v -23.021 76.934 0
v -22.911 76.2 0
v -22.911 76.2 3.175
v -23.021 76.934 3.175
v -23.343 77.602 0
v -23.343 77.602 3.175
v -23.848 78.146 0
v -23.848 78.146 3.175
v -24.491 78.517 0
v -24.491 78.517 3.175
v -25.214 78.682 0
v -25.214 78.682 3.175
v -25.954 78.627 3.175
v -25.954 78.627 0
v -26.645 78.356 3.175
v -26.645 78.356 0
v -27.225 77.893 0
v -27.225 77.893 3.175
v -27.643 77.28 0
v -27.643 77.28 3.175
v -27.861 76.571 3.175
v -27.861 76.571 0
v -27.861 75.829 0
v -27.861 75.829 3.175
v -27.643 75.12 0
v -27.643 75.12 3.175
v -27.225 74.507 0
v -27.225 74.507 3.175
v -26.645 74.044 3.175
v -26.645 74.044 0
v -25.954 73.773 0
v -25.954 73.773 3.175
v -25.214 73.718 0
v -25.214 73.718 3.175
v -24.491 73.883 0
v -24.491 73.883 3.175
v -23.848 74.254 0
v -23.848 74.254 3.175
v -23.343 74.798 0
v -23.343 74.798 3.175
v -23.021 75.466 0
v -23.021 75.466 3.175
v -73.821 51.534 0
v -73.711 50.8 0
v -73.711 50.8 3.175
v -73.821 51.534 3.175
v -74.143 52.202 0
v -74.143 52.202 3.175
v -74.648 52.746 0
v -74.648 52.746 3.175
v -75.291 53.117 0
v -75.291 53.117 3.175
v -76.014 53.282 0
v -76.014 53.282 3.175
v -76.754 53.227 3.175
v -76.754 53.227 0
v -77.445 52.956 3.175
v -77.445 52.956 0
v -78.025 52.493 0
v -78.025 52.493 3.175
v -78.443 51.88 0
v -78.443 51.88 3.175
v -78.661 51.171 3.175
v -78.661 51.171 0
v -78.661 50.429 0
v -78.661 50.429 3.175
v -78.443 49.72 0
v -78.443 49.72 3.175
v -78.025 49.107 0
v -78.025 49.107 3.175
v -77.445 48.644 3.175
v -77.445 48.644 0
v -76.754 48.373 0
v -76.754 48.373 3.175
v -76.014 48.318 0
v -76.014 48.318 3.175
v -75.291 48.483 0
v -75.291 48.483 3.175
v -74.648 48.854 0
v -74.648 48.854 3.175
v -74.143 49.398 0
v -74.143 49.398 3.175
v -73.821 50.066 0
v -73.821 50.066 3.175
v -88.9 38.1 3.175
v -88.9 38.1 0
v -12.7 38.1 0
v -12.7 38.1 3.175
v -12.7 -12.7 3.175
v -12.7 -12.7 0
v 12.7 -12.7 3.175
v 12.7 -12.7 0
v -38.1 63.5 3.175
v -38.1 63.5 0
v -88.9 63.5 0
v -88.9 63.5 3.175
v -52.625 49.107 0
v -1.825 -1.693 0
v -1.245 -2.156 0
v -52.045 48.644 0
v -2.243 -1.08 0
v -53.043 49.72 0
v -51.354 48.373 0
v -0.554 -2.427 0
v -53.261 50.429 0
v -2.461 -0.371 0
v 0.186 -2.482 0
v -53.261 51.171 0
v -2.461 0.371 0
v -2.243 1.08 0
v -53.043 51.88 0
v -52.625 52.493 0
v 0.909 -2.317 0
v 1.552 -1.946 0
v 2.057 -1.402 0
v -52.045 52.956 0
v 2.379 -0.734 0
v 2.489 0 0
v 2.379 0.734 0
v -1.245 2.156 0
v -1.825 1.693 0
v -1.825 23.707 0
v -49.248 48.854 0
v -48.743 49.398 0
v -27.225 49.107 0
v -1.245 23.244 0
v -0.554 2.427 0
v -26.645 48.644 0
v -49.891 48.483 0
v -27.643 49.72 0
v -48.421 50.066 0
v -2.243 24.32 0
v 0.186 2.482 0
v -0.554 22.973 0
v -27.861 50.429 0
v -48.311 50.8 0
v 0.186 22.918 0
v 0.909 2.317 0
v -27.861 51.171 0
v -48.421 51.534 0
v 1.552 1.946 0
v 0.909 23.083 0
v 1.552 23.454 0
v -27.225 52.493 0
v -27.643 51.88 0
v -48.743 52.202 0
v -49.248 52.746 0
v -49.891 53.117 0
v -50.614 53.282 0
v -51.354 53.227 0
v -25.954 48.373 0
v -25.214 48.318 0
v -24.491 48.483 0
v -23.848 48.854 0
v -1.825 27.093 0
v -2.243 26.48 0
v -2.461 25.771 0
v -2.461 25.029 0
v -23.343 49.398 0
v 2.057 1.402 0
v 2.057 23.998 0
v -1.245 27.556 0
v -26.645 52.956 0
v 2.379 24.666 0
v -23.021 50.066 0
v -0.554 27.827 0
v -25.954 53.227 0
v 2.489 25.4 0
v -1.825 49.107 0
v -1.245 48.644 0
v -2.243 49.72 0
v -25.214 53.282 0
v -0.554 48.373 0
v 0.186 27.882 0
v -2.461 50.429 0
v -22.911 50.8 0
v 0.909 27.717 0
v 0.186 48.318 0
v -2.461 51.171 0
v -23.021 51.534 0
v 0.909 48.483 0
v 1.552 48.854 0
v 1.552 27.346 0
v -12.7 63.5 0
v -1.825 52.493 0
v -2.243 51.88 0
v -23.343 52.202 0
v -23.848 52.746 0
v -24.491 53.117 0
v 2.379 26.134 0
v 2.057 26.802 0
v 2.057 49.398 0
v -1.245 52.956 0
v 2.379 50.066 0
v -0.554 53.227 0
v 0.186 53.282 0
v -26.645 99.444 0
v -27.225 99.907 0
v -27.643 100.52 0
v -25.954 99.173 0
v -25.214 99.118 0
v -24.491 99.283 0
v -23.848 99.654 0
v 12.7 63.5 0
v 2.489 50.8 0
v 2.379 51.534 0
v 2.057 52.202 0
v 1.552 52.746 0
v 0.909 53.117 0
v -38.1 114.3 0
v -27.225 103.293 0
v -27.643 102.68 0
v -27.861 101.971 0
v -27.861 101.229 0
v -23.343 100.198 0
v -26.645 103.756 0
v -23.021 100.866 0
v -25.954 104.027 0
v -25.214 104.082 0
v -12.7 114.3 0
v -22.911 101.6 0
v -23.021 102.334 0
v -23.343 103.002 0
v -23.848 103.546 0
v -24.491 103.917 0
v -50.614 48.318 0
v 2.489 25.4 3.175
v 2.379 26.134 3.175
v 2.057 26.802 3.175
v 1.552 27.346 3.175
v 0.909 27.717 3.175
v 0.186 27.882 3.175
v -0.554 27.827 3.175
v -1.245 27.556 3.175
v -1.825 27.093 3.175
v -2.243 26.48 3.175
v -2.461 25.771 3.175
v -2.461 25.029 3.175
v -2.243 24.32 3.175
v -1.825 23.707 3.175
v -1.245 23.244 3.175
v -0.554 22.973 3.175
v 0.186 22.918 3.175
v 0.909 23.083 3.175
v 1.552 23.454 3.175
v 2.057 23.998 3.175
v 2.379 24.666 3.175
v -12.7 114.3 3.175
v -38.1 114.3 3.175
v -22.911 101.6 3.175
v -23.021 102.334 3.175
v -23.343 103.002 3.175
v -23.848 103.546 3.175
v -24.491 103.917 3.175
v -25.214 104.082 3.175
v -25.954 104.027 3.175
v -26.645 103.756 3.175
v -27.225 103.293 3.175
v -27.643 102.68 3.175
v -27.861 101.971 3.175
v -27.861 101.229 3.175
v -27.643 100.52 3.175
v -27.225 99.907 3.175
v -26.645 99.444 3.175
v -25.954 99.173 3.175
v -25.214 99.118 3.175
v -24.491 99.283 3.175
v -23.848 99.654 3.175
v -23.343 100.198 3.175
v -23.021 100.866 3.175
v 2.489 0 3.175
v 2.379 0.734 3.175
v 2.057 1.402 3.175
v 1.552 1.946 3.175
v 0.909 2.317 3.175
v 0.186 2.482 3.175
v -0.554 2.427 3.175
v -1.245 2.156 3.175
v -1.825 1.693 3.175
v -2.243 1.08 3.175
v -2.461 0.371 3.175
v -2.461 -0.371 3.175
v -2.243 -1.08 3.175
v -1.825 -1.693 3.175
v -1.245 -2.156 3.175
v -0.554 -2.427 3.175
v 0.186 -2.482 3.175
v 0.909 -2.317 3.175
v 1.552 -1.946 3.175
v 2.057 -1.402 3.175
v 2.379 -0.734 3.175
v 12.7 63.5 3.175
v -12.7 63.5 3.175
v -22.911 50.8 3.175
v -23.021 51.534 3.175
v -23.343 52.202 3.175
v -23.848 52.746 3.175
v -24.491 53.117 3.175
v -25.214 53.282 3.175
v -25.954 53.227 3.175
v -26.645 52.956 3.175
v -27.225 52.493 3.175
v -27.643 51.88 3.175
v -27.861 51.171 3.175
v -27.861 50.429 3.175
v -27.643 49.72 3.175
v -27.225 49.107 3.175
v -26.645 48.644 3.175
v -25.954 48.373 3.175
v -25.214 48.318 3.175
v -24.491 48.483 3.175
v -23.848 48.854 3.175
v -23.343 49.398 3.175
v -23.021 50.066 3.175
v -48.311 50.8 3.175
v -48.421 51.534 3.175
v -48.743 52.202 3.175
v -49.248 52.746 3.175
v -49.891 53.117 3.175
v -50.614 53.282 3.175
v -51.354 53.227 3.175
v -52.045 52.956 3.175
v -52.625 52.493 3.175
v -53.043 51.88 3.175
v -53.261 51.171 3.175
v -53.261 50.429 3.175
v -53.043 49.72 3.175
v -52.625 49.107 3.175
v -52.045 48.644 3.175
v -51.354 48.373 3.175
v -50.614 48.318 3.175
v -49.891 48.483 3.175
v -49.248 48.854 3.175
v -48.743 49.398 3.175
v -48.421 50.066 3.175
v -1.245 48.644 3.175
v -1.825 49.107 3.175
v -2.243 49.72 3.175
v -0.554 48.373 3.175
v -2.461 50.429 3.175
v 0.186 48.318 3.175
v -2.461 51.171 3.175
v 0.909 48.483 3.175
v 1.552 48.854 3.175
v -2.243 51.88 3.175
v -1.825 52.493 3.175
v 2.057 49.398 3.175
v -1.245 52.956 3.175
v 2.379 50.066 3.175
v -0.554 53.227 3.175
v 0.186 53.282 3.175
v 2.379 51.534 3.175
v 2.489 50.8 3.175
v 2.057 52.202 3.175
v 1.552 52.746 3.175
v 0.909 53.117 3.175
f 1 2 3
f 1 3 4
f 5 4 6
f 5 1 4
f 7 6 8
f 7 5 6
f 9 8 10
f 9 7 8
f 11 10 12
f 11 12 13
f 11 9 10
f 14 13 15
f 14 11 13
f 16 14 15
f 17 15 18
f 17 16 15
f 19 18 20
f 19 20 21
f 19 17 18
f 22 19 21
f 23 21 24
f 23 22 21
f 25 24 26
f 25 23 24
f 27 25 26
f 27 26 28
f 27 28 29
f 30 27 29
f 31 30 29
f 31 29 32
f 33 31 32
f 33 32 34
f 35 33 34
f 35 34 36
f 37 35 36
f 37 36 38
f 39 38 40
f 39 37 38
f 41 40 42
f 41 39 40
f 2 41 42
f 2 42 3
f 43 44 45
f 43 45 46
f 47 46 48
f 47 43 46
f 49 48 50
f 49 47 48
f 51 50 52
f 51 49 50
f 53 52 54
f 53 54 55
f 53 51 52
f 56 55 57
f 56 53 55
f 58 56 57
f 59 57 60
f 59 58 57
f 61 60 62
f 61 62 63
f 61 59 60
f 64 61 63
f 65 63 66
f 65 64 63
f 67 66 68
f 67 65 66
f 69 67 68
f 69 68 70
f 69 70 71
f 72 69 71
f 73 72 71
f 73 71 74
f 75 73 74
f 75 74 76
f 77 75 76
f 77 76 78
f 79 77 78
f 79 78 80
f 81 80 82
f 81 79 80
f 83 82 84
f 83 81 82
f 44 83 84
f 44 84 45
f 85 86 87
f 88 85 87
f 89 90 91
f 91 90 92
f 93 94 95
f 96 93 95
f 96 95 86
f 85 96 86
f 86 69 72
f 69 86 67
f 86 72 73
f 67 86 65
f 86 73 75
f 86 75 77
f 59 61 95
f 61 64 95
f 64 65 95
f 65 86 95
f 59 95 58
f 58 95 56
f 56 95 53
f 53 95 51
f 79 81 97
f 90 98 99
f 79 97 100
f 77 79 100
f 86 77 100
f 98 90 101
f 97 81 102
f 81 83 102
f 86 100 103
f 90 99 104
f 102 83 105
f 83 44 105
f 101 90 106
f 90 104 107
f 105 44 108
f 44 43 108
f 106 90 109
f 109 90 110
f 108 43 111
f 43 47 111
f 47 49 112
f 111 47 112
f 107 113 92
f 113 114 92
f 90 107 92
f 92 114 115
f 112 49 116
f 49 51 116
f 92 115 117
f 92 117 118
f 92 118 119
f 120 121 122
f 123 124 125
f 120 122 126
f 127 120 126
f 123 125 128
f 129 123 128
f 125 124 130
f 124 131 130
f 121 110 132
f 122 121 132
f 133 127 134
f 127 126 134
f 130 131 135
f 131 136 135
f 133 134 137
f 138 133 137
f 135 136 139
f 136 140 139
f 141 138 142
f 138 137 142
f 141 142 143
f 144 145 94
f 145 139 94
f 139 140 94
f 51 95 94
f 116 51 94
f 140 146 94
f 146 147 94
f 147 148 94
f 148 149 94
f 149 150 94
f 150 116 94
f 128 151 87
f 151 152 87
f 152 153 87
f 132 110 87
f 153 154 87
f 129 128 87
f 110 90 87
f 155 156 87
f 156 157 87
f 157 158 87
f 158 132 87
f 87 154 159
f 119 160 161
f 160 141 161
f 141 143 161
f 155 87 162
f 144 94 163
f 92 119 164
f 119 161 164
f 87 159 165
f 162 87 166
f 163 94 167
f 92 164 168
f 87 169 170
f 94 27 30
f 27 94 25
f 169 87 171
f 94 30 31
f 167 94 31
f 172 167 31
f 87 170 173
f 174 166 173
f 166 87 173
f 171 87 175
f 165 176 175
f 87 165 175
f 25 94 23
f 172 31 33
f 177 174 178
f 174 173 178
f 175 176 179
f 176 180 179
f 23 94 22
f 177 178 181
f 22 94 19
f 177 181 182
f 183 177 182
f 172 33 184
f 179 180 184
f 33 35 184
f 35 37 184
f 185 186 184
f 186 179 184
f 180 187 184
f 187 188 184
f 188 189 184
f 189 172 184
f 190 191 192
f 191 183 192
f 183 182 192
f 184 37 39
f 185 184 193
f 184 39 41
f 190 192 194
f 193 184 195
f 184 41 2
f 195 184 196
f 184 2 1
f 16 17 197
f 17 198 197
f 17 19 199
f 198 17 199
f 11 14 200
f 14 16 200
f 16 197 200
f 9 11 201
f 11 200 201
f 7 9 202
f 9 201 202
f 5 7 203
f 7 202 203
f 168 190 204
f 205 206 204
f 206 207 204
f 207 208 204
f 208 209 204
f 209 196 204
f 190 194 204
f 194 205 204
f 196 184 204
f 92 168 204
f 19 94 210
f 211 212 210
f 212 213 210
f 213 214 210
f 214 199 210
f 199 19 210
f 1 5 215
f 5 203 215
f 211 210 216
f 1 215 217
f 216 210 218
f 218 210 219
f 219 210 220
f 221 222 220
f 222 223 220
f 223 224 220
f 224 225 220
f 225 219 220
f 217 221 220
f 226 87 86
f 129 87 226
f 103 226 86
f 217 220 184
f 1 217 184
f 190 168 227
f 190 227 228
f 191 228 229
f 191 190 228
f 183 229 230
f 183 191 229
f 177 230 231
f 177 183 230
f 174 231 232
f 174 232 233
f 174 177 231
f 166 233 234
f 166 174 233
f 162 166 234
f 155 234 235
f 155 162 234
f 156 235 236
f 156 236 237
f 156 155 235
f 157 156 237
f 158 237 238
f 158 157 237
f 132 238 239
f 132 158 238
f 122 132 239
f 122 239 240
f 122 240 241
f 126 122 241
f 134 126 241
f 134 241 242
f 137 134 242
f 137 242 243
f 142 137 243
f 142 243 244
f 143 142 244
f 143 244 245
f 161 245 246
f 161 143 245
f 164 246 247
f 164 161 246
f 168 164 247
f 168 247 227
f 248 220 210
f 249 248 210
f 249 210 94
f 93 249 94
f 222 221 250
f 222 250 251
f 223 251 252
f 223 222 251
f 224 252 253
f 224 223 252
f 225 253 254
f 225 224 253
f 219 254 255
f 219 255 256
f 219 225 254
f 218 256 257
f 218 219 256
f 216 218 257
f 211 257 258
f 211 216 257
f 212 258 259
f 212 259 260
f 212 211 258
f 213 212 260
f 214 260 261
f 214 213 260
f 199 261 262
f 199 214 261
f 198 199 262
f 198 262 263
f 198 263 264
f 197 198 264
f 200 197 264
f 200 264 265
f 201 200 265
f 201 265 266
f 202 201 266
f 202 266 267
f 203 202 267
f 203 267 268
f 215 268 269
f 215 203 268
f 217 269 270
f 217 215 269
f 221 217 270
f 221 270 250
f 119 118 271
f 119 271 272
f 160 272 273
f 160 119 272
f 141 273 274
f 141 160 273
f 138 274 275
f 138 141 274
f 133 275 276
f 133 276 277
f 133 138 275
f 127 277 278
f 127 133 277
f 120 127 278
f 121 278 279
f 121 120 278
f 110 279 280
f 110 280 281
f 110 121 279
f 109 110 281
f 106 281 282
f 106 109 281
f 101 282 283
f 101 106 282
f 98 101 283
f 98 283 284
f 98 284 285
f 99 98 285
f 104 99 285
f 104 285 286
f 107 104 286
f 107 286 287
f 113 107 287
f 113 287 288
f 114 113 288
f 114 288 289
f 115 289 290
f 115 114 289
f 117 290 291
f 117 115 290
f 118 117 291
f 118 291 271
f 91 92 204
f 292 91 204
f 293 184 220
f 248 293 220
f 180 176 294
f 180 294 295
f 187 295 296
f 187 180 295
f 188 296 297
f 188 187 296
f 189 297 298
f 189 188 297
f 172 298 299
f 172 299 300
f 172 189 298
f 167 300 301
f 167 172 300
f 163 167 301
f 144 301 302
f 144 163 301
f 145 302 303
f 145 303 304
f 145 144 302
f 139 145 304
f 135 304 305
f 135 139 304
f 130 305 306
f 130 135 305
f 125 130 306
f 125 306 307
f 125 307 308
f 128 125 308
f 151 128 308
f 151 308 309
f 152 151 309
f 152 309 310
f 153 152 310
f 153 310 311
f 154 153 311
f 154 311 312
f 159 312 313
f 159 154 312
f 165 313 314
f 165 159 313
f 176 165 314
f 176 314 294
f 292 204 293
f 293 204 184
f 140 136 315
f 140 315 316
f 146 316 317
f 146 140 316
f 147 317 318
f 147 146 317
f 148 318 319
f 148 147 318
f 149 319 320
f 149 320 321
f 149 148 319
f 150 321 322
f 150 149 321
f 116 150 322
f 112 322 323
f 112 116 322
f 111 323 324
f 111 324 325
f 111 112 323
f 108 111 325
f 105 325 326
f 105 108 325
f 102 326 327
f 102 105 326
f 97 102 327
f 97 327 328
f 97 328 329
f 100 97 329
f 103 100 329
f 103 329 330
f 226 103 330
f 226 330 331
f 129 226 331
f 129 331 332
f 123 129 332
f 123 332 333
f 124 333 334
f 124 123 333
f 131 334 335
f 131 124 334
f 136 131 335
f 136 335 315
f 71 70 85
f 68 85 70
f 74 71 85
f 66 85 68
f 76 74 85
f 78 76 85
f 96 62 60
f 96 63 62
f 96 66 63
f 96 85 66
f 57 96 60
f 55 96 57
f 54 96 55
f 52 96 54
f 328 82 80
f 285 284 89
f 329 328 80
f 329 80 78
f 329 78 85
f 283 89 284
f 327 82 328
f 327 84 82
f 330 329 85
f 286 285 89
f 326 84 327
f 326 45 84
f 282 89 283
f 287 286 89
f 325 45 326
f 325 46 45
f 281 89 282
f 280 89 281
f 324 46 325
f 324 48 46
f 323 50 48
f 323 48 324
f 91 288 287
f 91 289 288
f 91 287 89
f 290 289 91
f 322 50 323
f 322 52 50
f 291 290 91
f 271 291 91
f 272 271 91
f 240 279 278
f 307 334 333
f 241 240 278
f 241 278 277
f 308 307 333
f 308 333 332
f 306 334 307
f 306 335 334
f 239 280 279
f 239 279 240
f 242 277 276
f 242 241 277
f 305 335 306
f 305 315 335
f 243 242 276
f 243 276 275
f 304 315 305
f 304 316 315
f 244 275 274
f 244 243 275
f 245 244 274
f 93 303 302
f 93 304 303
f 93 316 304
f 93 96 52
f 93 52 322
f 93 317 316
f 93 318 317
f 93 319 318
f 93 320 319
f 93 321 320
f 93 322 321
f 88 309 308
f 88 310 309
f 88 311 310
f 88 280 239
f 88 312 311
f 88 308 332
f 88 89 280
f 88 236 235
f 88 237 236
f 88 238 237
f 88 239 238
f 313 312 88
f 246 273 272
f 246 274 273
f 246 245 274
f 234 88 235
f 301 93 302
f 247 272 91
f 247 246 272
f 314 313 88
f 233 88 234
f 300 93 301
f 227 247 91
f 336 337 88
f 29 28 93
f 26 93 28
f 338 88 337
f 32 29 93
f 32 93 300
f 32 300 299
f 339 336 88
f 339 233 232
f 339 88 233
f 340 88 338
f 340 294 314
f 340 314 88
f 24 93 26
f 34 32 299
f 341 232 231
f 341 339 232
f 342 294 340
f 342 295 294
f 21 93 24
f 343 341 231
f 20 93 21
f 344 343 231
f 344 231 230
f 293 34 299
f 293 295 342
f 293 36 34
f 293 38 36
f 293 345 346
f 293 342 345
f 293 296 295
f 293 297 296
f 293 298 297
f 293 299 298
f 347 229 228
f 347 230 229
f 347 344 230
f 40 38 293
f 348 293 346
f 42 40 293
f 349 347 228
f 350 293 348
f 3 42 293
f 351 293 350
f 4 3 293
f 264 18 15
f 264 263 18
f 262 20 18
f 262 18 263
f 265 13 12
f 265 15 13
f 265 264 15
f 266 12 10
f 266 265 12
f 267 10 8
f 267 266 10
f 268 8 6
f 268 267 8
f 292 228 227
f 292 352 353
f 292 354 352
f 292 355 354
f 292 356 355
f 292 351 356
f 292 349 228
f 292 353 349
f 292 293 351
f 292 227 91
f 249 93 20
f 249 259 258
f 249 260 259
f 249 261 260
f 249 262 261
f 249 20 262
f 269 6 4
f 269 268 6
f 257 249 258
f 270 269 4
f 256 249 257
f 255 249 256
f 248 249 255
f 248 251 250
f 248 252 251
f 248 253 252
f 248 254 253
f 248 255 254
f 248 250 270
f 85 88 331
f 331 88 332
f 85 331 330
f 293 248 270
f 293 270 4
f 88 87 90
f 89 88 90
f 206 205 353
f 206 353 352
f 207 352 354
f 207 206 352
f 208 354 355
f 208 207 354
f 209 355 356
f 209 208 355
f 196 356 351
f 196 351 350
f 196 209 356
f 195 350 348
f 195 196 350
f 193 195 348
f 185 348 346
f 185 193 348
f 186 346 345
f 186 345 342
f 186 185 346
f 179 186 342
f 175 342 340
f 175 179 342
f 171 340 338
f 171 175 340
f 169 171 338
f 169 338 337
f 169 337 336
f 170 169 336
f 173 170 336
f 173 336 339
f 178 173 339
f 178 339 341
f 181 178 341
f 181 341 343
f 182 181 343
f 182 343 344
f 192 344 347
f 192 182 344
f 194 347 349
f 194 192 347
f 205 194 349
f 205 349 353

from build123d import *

# Parameters (mm, degrees)
F0_R     = 2.4892
F1_DEPTH = 3.175


with BuildPart() as f1:
    # F0 (on Top) → F1 (new body)
    with BuildSketch(Plane.XY):
        Polygon((-88.9, 63.5), (-88.9, 38.1), (-12.7, 38.1), (-12.7, -12.7), (12.7, -12.7), (12.7, 63.5), (-12.7, 63.5), (-12.7, 114.3), (-38.1, 114.3), (-38.1, 63.5), align=None)
        Circle(F0_R, mode=Mode.SUBTRACT)
        with Locations((0, 25.4)):
            Circle(F0_R, mode=Mode.SUBTRACT)
        with Locations((-76.2, 50.8)):
            Circle(F0_R, mode=Mode.SUBTRACT)
        with Locations((-50.8, 50.8)):
            Circle(F0_R, mode=Mode.SUBTRACT)
        with Locations((-25.4, 50.8)):
            Circle(F0_R, mode=Mode.SUBTRACT)
        with Locations((-25.4, 76.2)):
            Circle(F0_R, mode=Mode.SUBTRACT)
        with Locations((0, 50.8)):
            Circle(F0_R, mode=Mode.SUBTRACT)
        with Locations((-25.4, 101.6)):
            Circle(F0_R, mode=Mode.SUBTRACT)
    extrude(amount=F1_DEPTH)


solid = f1.part
